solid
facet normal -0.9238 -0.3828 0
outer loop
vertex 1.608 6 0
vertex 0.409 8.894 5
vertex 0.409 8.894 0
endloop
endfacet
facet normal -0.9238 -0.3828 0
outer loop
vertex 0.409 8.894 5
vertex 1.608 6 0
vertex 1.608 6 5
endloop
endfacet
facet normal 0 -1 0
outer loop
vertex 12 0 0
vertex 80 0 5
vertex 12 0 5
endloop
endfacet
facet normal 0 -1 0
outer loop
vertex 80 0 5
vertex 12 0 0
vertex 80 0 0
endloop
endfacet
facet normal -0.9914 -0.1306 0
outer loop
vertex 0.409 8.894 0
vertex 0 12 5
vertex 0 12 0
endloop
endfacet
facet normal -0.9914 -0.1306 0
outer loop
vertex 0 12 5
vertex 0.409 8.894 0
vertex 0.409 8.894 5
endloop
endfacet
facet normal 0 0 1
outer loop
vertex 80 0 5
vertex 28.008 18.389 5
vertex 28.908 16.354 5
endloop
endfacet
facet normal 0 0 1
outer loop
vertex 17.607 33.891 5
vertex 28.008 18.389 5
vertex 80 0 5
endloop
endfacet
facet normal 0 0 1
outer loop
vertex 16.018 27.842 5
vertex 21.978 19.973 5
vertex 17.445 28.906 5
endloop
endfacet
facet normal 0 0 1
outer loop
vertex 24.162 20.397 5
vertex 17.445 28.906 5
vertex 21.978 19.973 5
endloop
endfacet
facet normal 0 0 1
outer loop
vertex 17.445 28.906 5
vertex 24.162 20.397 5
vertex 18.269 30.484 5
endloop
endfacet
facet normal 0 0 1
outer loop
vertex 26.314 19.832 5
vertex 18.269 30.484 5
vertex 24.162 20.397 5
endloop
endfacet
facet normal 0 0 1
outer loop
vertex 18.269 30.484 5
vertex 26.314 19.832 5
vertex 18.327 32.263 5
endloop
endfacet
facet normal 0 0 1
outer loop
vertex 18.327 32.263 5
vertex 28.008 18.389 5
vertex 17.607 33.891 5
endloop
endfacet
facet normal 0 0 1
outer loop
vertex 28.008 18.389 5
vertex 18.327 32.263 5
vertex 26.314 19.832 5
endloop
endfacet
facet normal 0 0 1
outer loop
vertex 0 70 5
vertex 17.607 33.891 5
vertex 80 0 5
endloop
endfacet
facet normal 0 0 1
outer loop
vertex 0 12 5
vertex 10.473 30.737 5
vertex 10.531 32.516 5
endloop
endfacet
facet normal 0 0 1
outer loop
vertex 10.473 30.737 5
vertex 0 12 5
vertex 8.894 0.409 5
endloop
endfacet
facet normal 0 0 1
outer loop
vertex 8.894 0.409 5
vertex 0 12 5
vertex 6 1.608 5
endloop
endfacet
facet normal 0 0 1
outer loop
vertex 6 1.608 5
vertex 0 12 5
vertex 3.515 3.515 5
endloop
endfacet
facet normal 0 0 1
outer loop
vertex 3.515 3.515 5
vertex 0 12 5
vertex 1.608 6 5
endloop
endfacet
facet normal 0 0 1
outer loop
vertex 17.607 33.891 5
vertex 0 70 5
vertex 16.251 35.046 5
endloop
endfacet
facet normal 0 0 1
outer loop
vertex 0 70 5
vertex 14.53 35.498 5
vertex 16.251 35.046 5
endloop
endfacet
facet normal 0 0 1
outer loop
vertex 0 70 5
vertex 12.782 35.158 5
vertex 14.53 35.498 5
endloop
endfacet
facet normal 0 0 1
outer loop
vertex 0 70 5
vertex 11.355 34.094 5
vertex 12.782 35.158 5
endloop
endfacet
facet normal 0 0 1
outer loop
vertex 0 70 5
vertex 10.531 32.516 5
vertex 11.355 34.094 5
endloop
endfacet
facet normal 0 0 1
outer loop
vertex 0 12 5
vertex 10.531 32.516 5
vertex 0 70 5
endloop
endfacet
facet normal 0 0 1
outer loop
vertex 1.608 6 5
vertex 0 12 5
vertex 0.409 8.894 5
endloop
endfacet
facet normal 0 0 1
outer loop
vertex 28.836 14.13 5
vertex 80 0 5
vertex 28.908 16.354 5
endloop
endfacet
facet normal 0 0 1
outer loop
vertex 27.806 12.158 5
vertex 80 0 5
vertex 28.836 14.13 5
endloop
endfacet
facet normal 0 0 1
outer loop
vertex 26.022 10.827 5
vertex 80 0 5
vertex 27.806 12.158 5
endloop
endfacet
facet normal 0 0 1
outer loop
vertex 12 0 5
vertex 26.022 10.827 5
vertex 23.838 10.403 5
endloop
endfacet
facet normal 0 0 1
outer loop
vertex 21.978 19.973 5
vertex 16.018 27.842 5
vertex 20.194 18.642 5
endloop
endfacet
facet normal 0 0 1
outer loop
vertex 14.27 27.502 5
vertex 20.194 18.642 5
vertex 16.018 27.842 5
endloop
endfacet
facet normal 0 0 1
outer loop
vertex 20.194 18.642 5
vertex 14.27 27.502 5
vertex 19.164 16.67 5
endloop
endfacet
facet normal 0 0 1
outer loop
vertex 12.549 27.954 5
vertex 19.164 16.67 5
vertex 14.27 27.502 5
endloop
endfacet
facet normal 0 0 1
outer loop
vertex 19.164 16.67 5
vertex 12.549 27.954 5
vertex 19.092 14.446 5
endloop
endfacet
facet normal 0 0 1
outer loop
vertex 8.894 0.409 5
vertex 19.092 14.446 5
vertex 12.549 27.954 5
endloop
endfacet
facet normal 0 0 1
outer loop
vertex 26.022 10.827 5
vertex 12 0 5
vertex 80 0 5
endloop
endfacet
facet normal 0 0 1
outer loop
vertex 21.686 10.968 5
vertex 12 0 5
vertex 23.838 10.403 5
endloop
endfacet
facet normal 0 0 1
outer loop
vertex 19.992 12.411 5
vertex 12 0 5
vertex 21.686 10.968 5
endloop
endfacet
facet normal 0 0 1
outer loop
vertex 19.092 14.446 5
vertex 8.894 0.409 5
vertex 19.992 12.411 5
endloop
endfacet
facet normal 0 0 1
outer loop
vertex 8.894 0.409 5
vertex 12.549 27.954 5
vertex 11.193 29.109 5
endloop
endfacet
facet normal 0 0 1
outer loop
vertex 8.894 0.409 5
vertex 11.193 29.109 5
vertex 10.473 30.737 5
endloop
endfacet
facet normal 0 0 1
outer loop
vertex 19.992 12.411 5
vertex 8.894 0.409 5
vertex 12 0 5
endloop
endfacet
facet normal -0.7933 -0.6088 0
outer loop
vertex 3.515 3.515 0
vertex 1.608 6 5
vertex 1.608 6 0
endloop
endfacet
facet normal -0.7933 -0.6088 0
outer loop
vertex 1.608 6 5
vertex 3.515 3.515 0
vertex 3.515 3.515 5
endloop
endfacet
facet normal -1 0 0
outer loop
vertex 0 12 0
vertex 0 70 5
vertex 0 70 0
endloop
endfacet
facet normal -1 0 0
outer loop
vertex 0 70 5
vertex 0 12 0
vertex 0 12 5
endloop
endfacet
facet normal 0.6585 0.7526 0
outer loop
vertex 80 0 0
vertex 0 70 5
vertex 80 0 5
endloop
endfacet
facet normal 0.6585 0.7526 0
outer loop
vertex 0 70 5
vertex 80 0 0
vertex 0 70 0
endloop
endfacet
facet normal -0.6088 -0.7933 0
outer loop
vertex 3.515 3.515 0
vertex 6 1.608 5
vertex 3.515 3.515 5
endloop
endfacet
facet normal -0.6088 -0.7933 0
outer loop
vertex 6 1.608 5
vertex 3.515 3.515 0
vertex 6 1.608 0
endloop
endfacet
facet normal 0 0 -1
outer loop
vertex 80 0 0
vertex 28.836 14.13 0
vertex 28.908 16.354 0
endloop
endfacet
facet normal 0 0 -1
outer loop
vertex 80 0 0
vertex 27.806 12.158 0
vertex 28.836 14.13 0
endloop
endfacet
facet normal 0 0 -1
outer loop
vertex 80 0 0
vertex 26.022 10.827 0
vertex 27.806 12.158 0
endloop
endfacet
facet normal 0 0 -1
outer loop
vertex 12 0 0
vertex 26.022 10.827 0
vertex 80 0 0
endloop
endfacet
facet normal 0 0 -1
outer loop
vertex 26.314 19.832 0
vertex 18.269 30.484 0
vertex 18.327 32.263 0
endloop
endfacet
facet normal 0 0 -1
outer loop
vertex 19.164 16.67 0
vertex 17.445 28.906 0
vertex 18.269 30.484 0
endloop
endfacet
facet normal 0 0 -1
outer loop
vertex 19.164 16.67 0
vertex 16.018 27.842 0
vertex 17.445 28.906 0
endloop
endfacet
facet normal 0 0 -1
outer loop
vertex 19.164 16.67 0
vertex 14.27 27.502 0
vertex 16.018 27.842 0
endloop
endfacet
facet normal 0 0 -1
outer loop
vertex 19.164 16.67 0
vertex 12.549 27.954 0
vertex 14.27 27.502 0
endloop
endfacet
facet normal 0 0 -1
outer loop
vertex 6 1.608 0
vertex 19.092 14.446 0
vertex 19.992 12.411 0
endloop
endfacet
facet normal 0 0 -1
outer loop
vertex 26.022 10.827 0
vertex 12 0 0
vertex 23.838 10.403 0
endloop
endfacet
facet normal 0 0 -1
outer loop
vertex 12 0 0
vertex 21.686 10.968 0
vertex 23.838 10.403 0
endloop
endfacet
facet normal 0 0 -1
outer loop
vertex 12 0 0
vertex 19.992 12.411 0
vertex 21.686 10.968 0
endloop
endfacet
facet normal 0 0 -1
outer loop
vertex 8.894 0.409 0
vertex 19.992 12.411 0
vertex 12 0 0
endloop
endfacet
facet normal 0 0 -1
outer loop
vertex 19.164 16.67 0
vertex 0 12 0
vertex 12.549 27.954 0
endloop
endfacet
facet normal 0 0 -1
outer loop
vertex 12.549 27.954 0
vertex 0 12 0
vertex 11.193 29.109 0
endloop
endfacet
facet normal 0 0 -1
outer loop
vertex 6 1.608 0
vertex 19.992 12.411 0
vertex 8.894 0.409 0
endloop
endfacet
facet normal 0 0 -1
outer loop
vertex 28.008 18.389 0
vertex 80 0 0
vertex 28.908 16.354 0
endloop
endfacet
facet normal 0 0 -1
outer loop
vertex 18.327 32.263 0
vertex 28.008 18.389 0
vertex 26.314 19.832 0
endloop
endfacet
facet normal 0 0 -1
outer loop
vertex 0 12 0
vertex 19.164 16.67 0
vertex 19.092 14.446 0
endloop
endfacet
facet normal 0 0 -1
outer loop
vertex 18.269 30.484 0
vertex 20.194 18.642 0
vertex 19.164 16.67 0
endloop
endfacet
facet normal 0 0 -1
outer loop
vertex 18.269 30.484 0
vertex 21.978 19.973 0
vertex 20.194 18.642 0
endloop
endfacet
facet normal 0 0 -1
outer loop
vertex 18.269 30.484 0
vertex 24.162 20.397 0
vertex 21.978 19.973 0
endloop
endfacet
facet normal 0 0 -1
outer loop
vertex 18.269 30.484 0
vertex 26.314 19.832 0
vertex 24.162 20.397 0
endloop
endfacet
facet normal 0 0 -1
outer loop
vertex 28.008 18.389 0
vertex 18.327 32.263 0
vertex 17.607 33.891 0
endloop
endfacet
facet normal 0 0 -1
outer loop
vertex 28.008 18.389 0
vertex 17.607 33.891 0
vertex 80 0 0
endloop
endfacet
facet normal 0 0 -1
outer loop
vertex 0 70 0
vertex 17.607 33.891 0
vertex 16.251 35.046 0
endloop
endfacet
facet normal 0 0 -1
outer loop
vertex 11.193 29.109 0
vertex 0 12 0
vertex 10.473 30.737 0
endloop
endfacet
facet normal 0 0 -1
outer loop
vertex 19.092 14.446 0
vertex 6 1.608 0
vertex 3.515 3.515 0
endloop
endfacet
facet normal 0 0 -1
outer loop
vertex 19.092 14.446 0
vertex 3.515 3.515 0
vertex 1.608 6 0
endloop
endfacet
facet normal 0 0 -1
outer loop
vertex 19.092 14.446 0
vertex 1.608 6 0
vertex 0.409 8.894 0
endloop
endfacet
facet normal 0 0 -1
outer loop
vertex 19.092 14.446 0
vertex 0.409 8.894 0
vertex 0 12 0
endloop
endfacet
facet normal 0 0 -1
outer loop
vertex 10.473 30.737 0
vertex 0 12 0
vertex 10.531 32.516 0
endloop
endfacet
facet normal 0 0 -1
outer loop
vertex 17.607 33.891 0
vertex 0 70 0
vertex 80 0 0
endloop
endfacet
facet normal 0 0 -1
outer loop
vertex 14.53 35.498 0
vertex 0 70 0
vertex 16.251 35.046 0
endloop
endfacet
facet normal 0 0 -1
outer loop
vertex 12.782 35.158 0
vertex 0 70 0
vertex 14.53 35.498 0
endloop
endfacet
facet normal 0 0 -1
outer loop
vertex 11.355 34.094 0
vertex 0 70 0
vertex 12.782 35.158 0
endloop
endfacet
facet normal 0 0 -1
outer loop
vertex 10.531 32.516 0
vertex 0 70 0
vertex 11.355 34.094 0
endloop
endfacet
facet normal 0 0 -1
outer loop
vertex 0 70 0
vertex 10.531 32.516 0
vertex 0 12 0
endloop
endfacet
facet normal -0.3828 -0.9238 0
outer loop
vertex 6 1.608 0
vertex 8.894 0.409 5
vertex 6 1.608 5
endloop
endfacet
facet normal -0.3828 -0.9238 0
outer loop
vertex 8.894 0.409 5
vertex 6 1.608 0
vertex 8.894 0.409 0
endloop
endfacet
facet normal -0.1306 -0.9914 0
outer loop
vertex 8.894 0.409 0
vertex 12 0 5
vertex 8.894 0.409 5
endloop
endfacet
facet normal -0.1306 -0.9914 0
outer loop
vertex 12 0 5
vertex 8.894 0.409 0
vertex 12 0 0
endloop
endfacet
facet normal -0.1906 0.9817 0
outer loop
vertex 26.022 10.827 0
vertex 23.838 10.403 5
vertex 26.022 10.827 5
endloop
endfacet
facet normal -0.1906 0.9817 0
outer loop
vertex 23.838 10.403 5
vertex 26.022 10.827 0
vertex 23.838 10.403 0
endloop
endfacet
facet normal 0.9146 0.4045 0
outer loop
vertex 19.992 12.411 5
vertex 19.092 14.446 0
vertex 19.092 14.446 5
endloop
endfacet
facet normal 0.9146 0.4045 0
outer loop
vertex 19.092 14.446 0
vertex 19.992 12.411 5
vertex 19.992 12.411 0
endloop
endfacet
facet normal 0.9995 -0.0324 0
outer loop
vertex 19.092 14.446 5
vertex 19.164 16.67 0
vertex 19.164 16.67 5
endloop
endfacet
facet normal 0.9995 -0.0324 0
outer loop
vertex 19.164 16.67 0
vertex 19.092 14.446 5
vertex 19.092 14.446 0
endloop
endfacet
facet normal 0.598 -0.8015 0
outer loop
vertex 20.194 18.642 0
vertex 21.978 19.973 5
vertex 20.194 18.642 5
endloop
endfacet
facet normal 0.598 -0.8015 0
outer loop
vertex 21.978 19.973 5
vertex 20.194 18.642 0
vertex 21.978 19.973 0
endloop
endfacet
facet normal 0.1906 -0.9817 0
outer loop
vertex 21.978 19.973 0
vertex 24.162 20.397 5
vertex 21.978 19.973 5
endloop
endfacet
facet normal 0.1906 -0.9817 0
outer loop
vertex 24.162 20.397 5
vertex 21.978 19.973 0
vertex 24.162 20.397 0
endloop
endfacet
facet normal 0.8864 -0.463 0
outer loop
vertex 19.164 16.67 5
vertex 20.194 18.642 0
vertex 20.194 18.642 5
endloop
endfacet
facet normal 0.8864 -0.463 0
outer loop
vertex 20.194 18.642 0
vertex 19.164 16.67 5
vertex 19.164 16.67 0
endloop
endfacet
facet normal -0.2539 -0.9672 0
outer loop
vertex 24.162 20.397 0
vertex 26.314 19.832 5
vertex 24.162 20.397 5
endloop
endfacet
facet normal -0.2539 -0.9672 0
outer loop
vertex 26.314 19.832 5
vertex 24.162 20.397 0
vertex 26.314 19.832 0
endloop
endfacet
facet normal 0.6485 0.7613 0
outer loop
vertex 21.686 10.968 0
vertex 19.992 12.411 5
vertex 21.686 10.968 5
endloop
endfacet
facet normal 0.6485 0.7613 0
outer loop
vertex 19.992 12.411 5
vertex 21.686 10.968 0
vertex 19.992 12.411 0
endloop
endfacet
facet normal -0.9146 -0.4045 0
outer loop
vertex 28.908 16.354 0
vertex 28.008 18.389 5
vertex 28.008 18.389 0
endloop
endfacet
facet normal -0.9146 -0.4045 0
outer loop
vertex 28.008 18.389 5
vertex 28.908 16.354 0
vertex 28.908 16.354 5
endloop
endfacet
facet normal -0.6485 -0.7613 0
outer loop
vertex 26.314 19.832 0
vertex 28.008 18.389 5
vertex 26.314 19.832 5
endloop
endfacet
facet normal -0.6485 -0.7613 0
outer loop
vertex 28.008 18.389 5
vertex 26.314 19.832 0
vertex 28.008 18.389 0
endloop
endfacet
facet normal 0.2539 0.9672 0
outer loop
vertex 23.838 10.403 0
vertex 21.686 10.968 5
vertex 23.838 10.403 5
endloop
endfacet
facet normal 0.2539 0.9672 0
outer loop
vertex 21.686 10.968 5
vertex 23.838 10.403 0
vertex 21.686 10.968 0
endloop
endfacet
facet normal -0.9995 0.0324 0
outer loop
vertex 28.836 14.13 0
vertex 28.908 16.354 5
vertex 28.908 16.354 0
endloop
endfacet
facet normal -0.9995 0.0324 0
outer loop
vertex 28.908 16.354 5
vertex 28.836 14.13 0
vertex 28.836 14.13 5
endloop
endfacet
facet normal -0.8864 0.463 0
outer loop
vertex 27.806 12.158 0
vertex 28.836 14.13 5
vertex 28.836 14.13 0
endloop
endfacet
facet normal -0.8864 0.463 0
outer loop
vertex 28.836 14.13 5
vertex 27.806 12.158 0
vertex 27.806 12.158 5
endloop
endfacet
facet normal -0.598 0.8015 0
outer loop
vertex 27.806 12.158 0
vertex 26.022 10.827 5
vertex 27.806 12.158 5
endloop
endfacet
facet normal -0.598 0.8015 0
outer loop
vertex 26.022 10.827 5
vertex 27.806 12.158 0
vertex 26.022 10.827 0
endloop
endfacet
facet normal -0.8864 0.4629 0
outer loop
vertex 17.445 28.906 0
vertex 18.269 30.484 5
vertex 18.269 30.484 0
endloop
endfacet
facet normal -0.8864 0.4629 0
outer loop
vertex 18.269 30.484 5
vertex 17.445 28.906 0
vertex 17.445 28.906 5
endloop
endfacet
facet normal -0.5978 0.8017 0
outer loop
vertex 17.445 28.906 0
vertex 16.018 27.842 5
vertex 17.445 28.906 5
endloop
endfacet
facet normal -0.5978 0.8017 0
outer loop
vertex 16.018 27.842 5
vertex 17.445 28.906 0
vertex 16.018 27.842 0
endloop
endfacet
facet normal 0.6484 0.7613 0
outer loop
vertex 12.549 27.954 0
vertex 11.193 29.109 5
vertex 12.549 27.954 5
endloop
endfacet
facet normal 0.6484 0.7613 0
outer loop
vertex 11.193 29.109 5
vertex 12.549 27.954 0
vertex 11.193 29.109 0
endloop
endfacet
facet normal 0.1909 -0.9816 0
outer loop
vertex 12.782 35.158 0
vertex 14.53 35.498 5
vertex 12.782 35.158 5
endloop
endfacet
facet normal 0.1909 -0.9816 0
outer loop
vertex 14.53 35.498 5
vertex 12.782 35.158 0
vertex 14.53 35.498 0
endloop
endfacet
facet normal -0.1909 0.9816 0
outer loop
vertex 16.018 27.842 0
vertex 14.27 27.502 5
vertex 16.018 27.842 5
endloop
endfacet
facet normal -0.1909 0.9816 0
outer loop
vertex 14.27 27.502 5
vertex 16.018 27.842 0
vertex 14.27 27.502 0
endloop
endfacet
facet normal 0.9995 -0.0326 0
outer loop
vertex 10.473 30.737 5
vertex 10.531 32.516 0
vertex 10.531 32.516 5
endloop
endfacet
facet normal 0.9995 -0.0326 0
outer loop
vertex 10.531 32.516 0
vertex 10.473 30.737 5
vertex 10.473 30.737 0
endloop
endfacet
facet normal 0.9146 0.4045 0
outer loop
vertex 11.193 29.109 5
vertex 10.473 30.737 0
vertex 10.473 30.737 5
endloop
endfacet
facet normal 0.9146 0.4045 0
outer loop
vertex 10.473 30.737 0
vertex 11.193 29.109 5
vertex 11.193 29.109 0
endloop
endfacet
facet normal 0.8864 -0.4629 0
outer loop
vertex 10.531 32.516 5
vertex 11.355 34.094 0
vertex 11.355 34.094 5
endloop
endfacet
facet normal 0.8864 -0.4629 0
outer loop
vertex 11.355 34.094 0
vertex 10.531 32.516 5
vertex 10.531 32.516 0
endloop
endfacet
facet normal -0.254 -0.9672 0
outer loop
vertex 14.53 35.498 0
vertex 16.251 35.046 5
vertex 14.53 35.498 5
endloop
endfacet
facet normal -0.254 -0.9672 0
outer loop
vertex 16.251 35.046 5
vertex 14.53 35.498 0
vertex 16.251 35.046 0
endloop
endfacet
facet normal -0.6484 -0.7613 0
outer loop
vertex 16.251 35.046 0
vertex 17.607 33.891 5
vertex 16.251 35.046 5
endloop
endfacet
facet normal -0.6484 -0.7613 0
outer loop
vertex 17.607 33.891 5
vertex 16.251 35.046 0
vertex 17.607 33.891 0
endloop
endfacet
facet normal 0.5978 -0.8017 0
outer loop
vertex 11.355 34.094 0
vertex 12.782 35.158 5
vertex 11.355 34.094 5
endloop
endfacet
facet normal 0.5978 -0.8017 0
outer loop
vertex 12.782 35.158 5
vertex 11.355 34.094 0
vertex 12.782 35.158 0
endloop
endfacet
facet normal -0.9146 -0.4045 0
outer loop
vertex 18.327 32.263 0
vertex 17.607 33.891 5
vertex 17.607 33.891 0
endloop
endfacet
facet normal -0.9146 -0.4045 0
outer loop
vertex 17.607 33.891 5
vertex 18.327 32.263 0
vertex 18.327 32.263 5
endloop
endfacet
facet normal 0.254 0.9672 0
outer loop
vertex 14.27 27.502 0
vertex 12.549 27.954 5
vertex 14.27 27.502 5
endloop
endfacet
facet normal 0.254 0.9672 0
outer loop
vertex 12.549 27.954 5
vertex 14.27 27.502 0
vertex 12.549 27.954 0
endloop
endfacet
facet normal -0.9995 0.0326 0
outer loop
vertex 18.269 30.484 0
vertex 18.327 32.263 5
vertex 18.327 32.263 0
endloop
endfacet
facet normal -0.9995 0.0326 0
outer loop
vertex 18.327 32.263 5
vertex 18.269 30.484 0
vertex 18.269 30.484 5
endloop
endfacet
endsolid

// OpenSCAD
$fn = 32;

// ----------------------------------------------------------------------
// Bracket plate: corner pad 80 x 70, fillet R12
// ----------------------------------------------------------------------

// --- parameters (mm) ---
hole_r = 4;               // bolt hole radius
plate_t = 5;              // plate thickness, Z (extrusion height)
leg_a = 80;               // base leg
leg_b = 70;               // height leg
fillet_r = 12;            // right-angle fillet radius

hole_d1 = 2 * hole_r + 2;
hole_d2 = 2 * hole_r;

profile = [[12, 0], [80, 0], [0, 70], [0, 12], [0.409, 8.894], [1.608, 6], [3.515, 3.515], [6, 1.608], [8.894, 0.409]];  // primary outline, 9 points, counter clockwise
void_1 = [[28.908, 16.354], [28.008, 18.389], [26.314, 19.832], [24.162, 20.397], [21.978, 19.973], [20.194, 18.642], [19.164, 16.67], [19.092, 14.446], [19.992, 12.411], [21.686, 10.968], [23.838, 10.403], [26.022, 10.827], [27.806, 12.158], [28.836, 14.13]];  // mount hole 1, 14 points
void_2 = [[18.327, 32.263], [17.607, 33.891], [16.251, 35.046], [14.53, 35.498], [12.782, 35.158], [11.355, 34.094], [10.531, 32.516], [10.473, 30.737], [11.193, 29.109], [12.549, 27.954], [14.27, 27.502], [16.018, 27.842], [17.445, 28.906], [18.269, 30.484]];  // mount hole 2, 14 points

// --- the one profile operation ---
difference() {
  linear_extrude(height = plate_t) polygon(points = profile);
  translate([0, 0, -1])
    linear_extrude(height = plate_t + 2) polygon(points = void_1);
  translate([0, 0, -1])
    linear_extrude(height = plate_t + 2) polygon(points = void_2);
}
